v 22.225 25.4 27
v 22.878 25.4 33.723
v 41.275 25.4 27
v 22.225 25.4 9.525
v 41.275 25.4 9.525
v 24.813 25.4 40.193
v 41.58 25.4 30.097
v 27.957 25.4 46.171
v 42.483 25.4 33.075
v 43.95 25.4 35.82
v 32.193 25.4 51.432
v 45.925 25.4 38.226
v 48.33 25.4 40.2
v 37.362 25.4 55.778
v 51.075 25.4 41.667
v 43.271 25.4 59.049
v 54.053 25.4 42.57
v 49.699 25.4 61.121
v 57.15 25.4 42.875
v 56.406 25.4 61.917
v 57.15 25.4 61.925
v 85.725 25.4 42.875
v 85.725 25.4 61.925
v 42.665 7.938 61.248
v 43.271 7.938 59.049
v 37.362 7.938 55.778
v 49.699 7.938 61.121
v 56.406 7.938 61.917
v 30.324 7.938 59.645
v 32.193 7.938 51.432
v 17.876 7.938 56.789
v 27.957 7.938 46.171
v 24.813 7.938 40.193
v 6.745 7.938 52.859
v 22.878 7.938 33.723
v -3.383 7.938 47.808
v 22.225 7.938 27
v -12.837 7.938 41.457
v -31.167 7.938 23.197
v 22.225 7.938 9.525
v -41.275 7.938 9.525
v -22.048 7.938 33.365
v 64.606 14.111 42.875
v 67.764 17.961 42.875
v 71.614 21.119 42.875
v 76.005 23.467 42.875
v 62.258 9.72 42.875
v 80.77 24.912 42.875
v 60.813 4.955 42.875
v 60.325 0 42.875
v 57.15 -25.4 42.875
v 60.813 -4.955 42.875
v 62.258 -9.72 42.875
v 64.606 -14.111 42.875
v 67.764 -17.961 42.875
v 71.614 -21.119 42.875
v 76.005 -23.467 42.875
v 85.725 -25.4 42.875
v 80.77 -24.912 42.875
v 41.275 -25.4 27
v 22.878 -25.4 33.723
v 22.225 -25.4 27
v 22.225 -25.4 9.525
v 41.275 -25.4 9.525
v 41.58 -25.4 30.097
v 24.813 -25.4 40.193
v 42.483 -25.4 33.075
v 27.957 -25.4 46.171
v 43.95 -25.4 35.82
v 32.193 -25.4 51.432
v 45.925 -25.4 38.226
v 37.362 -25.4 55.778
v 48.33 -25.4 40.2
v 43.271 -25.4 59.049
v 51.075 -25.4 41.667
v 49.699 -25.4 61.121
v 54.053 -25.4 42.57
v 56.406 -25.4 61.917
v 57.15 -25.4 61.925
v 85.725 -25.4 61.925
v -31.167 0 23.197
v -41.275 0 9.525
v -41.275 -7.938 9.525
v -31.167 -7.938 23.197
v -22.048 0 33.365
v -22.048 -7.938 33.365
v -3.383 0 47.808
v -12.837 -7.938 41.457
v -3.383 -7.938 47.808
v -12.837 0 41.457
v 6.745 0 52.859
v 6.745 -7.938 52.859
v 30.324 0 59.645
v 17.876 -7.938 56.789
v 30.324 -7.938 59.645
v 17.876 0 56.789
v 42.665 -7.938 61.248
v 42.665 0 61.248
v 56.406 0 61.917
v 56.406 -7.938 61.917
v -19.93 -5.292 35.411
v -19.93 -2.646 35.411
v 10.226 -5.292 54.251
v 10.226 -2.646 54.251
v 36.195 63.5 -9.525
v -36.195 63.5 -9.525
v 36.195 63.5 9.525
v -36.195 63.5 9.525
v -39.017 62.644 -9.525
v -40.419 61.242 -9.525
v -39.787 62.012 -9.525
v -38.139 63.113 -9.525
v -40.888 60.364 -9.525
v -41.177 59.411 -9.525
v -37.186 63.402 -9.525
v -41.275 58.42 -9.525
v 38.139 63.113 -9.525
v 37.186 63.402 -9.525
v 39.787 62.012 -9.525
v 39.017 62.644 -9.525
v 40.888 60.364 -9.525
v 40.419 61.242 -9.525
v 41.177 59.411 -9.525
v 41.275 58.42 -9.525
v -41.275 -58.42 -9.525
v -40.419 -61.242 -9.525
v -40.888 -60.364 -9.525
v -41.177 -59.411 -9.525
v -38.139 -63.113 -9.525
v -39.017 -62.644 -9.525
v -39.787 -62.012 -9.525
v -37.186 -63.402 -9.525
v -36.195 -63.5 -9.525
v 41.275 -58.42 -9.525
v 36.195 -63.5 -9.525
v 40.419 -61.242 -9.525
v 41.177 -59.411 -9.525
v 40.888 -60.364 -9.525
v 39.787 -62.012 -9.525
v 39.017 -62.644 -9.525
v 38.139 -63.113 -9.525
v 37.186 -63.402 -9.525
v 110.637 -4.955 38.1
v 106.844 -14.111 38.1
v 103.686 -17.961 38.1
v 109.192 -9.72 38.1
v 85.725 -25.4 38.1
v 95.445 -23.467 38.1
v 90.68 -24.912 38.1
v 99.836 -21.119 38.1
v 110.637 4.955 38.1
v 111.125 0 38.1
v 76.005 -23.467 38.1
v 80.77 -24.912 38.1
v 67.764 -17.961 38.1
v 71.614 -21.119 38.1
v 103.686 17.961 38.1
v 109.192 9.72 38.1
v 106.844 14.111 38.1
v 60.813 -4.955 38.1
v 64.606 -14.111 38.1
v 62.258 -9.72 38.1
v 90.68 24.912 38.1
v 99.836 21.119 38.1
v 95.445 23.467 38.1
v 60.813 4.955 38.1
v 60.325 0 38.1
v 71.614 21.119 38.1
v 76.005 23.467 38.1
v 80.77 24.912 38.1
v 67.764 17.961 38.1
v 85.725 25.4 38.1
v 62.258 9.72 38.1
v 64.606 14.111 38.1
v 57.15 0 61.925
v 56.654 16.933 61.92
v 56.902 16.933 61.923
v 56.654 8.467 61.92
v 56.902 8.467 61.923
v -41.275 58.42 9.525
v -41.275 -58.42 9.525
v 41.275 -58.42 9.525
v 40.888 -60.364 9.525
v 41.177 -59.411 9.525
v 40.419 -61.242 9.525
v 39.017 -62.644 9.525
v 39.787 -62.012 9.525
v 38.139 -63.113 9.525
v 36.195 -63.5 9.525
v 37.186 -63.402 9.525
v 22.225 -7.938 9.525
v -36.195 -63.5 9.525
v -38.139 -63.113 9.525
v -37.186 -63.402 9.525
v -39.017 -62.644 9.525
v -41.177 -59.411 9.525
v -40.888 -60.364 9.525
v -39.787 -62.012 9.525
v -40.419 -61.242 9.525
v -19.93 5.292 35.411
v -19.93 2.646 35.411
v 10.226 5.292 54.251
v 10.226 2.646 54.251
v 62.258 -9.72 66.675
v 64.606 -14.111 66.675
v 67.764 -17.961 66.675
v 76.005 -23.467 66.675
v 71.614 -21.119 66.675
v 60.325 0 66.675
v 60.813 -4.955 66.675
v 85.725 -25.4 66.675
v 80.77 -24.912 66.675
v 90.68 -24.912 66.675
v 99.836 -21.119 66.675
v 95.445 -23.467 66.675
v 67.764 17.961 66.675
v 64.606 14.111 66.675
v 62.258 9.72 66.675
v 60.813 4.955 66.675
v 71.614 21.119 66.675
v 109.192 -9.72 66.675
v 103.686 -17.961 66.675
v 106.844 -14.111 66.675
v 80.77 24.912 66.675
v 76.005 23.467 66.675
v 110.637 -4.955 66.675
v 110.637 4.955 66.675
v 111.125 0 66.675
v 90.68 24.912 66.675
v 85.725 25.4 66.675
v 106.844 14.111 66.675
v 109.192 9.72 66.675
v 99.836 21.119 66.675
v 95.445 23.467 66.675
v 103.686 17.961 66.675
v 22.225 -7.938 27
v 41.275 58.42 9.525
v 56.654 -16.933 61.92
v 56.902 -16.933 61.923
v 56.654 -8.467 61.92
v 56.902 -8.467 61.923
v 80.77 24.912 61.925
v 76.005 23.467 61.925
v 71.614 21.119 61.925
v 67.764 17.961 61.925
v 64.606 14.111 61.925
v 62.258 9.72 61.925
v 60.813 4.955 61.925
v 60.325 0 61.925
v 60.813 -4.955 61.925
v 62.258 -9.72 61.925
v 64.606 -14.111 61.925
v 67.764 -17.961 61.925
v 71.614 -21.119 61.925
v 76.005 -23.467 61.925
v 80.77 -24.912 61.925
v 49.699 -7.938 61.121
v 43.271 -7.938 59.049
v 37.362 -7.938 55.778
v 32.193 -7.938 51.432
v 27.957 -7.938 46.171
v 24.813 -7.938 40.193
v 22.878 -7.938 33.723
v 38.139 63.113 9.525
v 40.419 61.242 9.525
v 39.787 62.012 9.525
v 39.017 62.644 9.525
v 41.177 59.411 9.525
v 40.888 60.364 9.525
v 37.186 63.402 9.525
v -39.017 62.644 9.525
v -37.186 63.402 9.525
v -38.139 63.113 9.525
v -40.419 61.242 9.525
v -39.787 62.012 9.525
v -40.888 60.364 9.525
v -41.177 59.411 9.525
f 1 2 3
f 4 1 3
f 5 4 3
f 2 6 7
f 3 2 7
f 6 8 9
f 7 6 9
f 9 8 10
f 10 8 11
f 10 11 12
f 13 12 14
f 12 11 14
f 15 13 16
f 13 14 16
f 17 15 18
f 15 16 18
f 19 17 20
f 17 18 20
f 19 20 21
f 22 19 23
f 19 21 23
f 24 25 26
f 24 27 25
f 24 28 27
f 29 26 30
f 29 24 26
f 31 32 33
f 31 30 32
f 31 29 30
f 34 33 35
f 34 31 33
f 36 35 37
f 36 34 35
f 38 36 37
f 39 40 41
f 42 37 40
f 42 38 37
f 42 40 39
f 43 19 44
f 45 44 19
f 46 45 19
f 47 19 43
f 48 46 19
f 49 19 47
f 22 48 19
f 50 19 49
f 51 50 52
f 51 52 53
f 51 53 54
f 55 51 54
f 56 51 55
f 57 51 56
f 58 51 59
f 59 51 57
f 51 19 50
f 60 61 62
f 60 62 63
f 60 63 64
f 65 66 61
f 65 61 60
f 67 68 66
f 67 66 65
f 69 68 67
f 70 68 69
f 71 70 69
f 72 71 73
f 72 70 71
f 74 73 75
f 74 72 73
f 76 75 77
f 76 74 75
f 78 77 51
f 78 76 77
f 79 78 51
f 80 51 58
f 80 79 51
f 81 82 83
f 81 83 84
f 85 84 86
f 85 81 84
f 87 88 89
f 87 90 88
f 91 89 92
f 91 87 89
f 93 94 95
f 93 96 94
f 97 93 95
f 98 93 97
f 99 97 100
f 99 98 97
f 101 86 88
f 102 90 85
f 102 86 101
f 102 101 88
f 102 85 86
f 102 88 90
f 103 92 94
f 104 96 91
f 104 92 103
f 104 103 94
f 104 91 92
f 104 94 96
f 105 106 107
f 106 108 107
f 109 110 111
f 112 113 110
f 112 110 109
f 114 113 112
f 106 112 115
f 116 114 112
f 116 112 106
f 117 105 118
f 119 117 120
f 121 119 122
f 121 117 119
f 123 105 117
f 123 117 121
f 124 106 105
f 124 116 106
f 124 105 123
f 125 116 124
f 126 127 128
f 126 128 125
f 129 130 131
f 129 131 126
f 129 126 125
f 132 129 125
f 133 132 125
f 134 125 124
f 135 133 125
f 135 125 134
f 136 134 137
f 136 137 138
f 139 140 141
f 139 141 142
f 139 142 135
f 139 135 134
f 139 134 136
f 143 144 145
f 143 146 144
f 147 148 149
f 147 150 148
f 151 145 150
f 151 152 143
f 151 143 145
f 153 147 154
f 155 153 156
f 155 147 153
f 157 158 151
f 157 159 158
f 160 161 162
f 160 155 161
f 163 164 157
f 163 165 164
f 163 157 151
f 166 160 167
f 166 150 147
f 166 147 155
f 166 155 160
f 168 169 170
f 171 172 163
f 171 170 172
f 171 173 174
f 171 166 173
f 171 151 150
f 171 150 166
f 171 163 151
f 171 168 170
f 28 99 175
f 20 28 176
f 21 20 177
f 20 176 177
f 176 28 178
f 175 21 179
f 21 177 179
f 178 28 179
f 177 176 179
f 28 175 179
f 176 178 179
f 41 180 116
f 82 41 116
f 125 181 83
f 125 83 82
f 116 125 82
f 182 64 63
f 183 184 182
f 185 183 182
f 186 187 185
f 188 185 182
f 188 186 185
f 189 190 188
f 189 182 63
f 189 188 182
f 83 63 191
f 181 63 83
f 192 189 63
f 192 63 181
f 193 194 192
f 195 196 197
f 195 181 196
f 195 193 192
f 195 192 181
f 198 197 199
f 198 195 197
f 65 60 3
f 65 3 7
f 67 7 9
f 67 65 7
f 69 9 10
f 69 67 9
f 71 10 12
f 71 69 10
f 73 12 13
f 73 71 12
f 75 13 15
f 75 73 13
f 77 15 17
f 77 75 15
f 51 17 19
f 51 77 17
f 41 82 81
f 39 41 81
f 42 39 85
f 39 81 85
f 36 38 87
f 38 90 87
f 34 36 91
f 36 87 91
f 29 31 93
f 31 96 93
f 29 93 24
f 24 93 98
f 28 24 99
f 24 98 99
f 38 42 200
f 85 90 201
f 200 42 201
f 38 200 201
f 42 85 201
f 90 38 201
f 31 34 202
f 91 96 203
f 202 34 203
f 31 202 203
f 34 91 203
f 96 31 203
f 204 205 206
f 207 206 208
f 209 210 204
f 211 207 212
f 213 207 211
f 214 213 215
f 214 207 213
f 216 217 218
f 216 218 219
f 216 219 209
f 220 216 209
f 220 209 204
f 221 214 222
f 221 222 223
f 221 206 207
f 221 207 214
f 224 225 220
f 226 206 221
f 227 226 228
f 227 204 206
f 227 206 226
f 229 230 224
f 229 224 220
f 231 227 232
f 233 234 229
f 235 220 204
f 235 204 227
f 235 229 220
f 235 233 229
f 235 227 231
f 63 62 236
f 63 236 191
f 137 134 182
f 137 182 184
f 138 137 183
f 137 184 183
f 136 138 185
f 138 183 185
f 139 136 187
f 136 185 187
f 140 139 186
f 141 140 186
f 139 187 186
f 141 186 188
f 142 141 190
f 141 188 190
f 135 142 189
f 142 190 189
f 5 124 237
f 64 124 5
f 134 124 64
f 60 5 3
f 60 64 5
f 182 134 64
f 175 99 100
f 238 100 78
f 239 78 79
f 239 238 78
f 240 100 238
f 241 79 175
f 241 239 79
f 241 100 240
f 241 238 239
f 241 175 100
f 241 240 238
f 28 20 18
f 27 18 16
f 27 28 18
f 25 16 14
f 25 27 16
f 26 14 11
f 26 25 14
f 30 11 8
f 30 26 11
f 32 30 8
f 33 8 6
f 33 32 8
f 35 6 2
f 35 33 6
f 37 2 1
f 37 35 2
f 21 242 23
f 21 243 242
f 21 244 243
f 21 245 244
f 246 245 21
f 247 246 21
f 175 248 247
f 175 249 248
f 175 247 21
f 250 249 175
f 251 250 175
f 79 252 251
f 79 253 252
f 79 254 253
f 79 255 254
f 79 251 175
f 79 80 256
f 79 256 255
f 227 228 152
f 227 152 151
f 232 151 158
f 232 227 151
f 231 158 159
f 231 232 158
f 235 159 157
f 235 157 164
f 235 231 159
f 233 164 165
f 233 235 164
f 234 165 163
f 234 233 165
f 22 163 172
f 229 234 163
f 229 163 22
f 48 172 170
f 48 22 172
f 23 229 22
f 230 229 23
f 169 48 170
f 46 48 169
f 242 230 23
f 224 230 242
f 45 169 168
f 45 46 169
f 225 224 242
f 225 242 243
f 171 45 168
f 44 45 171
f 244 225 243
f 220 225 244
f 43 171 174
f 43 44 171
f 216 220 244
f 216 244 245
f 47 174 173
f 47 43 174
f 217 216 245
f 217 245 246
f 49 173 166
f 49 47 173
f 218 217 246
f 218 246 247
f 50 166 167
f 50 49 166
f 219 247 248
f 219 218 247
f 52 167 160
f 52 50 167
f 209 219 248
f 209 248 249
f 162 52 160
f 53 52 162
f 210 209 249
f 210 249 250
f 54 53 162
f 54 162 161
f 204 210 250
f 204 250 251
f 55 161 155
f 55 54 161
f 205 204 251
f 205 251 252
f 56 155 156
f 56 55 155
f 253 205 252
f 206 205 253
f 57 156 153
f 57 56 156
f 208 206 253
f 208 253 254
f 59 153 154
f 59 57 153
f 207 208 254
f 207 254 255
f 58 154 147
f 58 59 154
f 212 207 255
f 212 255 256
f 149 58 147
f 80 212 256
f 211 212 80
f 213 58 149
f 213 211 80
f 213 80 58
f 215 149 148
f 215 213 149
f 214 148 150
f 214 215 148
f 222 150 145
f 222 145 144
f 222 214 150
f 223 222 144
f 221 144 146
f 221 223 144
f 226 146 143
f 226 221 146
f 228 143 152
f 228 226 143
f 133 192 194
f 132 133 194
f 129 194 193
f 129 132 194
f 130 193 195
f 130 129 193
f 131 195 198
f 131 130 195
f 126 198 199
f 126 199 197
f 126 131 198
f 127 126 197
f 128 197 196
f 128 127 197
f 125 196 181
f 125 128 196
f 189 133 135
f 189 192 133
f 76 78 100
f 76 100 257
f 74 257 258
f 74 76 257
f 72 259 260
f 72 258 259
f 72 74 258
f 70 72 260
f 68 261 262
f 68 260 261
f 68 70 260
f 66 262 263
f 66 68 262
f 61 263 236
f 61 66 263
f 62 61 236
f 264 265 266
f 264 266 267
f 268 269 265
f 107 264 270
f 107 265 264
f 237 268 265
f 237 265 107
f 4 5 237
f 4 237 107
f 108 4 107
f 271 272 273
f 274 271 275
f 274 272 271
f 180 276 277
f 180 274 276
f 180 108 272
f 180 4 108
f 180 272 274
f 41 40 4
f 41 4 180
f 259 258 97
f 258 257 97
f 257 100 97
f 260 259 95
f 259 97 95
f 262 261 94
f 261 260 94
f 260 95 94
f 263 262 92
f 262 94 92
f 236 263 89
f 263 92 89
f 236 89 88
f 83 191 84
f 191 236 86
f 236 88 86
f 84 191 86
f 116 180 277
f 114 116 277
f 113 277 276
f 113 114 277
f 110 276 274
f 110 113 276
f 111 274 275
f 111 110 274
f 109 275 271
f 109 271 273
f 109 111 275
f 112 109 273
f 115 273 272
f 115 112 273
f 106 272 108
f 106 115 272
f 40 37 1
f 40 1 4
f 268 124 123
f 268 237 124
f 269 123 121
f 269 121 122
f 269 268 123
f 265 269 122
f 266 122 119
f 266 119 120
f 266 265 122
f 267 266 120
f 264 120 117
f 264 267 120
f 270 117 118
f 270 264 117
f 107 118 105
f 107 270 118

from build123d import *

# Parameters (mm, degrees)
F1_DEPTH = 63.5
F2_DEPTH = 25.4
F3_DEPTH = 7.9375
F4_DEPTH = 25.4
F6_R     = 5.08
F7_R     = 5.08


with BuildPart() as f1:
    # F0 (on Front) → F1 (new body, symmetric)
    with BuildSketch(Plane.XZ):
        Polygon((22.225, 9.525), (-41.275, 9.525), (-41.275, -9.525), (41.275, -9.525), (41.275, 9.525), align=None)
    extrude(amount=F1_DEPTH, both=True)

    # F0 (on Front) → F2 (join, symmetric)
    with BuildSketch(Plane.XZ):
        with BuildLine():
            Line((22.225, 27.0002), (22.225, 9.525))
            Line((22.225, 9.525), (41.275, 9.525))
            Line((41.275, 9.525), (41.275, 27.0002))
            ThreePointArc((41.275, 27.0002), (45.92468, 38.22552), (57.15, 42.8752))
            Line((57.15, 42.8752), (60.325, 42.8752))
            Line((60.325, 42.8752), (60.325, 61.9252))
            Line((60.325, 61.9252), (57.15, 61.9252))
            add(Edge.make_bspline(
                [(56.406163, 61.917278), (56.653442, 61.920357), (56.901387, 61.922998), (57.15, 61.9252)],
                knots=[111.019471, 111.019471, 111.019471, 111.019471, 111.504536, 111.504536, 111.504536, 111.504536], degree=3))
            ThreePointArc((56.406163, 61.917278), (32.192695, 51.431503), (22.225, 27.0002))
        make_face()
    extrude(amount=F2_DEPTH, both=True)

    # F0 (on Front) → F3 (join, symmetric)
    with BuildSketch(Plane.XZ):
        with BuildLine():
            add(Edge.make_bspline(
                [(-41.275, 9.525), (-21.931022, 37.55873), (-0.190027, 61.212503), (56.406163, 61.917278)],
                knots=[0, 0, 0, 0, 111.019471, 111.019471, 111.019471, 111.019471], degree=3))
            Line((-41.275, 9.525), (22.225, 9.525))
            Line((22.225, 9.525), (22.225, 27.0002))
            ThreePointArc((22.225, 27.0002), (32.192695, 51.431503), (56.406163, 61.917278))
        make_face()
    extrude(amount=F3_DEPTH, both=True)

    # F0 (on Front) → F4 (join, symmetric)
    with BuildSketch(Plane.XZ):
        Polygon((81.447226, 61.9252), (60.325, 61.9252), (60.325, 42.8752), (81.447226, 42.8752), (85.725, 42.8752), (85.725, 61.9252), align=None)
    extrude(amount=F4_DEPTH, both=True)

    # F0 (on Front) → F5 (revolve)
    with BuildSketch(Plane.XZ):
        Polygon((111.125, 66.675), (85.725, 66.675), (85.725, 61.9252), (85.725, 42.8752), (85.725, 38.1), (111.125, 38.1), align=None)
    revolve(axis=Axis((85.725, 0, 52.3875), (0, 0, 1)))

    # F6
    f6_edges = [f1.edges().sort_by_distance(p)[0] for p in [
        (-41.275, -63.5, 0),
        (41.275, -63.5, 0),
        (41.275, 63.5, 0),
    ]]
    fillet(f6_edges, radius=F6_R)

    # F7
    f7_edges = [f1.edges().sort_by_distance(p)[0] for p in [
        (-41.275, 63.5, 0),
    ]]
    fillet(f7_edges, radius=F7_R)


solid = f1.part
